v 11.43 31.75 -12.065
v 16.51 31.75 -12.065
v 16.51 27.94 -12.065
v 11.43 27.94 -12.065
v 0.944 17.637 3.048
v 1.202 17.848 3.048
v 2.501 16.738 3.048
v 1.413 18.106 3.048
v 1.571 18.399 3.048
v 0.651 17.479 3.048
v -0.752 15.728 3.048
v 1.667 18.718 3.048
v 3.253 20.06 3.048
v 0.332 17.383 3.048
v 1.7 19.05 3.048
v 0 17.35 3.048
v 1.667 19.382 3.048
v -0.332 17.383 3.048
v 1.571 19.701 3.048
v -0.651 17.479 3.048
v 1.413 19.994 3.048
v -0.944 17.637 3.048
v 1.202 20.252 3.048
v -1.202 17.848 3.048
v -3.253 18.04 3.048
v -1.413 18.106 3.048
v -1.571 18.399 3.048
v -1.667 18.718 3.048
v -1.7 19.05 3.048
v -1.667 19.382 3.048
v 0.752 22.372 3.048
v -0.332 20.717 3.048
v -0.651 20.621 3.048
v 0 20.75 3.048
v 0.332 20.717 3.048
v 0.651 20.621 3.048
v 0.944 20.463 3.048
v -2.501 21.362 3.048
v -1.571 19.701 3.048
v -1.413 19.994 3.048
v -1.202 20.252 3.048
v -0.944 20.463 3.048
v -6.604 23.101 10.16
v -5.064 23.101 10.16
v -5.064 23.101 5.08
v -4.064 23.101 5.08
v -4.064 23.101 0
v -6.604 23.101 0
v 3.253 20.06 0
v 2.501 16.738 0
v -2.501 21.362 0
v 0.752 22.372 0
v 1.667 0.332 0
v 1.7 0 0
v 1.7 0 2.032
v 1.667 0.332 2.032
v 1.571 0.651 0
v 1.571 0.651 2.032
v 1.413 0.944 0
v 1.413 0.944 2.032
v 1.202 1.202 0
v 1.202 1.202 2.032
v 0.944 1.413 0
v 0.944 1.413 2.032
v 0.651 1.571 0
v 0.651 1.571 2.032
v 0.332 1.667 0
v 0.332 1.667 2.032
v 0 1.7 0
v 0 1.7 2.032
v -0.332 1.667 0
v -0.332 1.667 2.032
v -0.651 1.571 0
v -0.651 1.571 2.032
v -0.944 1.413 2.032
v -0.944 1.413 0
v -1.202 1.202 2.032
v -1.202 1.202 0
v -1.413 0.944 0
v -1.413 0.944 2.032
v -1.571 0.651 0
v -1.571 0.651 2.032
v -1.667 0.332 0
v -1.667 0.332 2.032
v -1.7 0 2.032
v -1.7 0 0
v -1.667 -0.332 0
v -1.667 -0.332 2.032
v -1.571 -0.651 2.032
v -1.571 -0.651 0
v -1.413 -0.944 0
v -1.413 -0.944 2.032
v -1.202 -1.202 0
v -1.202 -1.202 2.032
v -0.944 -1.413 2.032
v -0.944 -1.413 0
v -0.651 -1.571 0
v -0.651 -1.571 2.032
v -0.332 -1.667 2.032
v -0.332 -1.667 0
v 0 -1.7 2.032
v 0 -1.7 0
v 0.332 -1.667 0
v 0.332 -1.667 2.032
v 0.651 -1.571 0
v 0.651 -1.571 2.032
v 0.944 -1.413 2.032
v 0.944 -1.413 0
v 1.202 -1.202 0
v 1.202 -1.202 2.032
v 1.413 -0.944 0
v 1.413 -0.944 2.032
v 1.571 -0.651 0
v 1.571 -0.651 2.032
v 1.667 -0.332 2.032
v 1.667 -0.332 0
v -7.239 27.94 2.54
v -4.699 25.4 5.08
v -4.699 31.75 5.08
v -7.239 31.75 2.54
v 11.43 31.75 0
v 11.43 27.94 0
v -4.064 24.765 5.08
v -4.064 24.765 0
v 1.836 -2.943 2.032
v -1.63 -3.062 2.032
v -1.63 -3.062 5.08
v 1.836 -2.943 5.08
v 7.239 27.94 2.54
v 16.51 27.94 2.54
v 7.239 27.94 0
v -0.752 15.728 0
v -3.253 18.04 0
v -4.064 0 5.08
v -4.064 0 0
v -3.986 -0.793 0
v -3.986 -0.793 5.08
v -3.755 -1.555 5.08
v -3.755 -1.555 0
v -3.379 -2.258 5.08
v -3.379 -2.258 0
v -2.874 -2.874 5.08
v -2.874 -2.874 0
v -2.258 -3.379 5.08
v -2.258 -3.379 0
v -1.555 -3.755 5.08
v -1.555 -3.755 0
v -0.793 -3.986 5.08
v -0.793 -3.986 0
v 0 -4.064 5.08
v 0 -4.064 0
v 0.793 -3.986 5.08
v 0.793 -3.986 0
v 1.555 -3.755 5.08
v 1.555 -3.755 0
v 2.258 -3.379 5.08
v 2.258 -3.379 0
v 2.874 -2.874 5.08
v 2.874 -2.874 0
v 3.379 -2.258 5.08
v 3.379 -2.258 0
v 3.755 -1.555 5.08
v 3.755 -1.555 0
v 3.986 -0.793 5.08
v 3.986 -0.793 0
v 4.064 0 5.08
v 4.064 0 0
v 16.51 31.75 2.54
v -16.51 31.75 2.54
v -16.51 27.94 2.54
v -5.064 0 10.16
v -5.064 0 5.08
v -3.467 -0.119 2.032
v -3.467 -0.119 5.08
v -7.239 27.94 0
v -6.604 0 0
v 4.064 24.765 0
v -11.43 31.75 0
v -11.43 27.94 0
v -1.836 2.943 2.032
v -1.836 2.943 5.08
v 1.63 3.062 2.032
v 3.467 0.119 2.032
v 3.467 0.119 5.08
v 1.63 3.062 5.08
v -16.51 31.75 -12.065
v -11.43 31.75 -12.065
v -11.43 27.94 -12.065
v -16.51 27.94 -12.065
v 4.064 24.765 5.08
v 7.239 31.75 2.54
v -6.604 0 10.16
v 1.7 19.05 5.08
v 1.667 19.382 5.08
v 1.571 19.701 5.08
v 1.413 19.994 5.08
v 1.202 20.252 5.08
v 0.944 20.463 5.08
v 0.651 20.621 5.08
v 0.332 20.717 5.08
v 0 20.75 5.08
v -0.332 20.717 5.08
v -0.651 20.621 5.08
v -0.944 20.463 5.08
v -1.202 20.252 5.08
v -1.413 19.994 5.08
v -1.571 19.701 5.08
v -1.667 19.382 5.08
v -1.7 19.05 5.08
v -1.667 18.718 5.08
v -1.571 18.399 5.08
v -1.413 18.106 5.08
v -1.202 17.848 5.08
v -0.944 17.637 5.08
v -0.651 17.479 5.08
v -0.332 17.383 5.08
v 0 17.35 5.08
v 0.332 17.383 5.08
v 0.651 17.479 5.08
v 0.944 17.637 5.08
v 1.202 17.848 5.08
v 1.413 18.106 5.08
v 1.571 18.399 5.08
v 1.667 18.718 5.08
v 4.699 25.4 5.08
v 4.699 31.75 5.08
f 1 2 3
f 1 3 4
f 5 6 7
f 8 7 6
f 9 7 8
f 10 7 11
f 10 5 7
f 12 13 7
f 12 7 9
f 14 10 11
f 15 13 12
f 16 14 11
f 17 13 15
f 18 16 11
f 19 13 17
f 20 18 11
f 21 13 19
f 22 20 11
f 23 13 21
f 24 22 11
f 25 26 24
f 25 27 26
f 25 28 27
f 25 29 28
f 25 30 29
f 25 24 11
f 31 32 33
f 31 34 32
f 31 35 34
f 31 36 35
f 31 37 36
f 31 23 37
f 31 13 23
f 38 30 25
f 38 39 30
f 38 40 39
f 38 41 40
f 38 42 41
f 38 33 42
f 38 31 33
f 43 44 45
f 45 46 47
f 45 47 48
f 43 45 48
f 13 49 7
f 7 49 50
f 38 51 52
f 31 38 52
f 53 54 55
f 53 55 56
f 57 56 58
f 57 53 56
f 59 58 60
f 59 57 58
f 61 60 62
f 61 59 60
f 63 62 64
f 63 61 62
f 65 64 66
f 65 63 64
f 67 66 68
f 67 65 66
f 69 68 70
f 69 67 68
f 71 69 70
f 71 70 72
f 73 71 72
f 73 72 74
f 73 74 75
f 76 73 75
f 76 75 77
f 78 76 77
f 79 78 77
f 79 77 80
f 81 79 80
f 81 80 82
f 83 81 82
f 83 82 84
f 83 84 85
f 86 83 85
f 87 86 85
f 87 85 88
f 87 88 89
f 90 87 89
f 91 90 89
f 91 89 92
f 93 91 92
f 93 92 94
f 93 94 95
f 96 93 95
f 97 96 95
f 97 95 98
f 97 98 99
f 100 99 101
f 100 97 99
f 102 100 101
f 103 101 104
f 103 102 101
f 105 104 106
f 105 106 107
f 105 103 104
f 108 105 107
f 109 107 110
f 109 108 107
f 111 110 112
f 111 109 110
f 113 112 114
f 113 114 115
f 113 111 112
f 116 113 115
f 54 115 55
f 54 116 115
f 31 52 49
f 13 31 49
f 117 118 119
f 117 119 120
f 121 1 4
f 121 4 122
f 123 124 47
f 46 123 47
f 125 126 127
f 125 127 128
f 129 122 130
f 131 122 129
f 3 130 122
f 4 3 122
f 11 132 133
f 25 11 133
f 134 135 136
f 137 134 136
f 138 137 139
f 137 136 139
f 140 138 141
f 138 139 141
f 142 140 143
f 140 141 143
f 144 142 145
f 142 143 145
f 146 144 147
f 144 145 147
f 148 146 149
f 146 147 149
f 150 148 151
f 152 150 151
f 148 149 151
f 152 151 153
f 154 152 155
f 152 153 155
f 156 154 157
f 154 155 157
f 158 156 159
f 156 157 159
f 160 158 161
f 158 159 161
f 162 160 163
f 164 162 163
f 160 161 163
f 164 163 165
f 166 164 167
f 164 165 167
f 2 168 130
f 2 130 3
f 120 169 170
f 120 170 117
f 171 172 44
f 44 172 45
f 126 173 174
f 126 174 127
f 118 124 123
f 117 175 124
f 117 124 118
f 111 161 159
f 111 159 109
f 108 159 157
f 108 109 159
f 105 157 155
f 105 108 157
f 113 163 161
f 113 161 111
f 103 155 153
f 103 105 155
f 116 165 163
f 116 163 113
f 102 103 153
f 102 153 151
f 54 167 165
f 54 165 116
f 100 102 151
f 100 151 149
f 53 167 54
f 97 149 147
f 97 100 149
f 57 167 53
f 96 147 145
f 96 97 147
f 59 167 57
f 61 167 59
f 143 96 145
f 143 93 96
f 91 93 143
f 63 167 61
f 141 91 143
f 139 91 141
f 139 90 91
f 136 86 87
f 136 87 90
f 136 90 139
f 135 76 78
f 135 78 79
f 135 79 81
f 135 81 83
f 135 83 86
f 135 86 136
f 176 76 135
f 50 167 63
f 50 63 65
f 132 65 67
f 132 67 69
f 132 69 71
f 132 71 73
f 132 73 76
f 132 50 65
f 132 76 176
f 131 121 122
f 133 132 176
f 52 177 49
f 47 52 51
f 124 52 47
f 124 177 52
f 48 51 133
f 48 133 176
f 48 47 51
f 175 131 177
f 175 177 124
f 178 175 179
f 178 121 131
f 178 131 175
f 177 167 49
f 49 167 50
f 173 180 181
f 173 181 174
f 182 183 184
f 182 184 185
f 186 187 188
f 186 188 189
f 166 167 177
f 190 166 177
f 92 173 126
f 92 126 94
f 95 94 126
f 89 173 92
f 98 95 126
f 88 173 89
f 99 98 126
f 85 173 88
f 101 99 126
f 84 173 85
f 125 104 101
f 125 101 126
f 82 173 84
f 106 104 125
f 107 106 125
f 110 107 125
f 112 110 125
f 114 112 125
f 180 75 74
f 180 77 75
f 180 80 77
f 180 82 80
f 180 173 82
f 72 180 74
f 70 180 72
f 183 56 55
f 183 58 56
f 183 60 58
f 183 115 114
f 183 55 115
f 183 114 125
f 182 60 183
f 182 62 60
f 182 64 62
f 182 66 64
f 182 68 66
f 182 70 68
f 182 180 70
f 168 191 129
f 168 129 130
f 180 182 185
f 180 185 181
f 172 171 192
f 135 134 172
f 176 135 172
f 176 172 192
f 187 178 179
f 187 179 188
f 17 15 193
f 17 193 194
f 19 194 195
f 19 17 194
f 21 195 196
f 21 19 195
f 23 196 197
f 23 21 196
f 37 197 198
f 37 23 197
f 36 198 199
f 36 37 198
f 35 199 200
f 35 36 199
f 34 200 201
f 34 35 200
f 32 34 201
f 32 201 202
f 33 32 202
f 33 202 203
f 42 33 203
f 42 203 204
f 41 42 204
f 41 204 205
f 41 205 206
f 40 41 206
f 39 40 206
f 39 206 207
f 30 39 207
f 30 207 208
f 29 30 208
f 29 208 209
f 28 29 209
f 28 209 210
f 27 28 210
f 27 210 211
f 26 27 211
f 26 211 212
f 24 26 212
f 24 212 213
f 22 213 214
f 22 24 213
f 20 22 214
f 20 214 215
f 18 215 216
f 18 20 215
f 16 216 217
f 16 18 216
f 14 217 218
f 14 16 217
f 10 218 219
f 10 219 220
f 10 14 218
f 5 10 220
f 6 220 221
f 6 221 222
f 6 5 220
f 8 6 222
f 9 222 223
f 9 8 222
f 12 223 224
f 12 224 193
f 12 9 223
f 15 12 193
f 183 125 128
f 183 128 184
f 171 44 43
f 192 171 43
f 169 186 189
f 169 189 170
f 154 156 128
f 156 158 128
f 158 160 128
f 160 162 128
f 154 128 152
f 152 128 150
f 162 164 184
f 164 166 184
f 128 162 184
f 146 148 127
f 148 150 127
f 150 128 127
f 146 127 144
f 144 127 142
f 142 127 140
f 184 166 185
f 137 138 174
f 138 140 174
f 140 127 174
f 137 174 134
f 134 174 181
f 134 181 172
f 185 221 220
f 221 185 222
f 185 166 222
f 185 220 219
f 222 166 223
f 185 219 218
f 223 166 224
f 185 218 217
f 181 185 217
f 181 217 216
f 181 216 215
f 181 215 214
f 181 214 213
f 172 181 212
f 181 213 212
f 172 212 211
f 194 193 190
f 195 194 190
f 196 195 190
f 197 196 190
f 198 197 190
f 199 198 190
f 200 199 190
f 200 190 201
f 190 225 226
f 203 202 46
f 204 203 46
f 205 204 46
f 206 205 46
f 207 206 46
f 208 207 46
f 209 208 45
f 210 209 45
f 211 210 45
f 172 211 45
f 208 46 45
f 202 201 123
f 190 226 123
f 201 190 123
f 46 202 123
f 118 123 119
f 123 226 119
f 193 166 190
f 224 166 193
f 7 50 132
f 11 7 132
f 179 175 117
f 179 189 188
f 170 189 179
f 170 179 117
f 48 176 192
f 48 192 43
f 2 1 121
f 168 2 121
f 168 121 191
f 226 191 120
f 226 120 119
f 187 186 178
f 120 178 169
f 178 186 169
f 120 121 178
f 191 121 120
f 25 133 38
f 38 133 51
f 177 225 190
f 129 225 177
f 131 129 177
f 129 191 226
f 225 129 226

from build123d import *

# Parameters (mm, degrees)
SKETCH2_R           = 1.700000029
BOSS_EXTRUDE1_DEPTH = 5.08
SKETCH4_W           = 2.54
SKETCH4_H           = 23.100716355
BOSS_EXTRUDE3_DEPTH = 5.08
BOSS_EXTRUDE4_START = -5.08
SKETCH4_4_W         = 1.54
SKETCH4_4_H         = 23.100716355
BOSS_EXTRUDE4_DEPTH = 5.08
CUT_EXTRUDE1_START  = -3.048
SKETCH5_R           = 1.700000029
CUT_EXTRUDE1_DEPTH  = 3.048
CUT_EXTRUDE2_DEPTH  = 3.048
BOSS_EXTRUDE5_DEPTH = 3.81
CHAMFER4_SIZE       = 3.175
CHAMFER5_SIZE       = 3.175


with BuildPart() as part:
    # Sketch2 → Boss-Extrude1 (new body)
    with BuildSketch(Plane.XY):
        with BuildLine():
            Line((-4.064, 19.05), (-4.064, 0))
            ThreePointArc((-4.064, 0), (0, -4.064), (4.064, 0))
            Line((4.064, 0), (4.064, 19.05))
            Line((4.064, 19.05), (4.064, 31.75))
            Line((4.064, 31.75), (-4.064, 31.75))
            Line((-4.064, 31.75), (-4.064, 19.05))
        make_face()
        Circle(SKETCH2_R, mode=Mode.SUBTRACT)
        with Locations((0, 19.05)):
            Circle(SKETCH2_R, mode=Mode.SUBTRACT)
    extrude(amount=BOSS_EXTRUDE1_DEPTH)

    # Sketch4 → Boss-Extrude3 (add)
    with BuildSketch(Plane(origin=(0, 0, 0), x_dir=(-1, 0, 0), z_dir=(0, 0, -1))):
        with Locations((5.334, 11.550358178)):
            Rectangle(SKETCH4_W, SKETCH4_H)
    extrude(amount=-BOSS_EXTRUDE3_DEPTH)

    # Sketch4<4> → Boss-Extrude4 (add)
    with BuildSketch(Plane(origin=(0, 0, 0), x_dir=(-1, 0, 0), z_dir=(0, 0, -1)).offset(BOSS_EXTRUDE4_START)):
        with Locations((5.834, 11.550358178)):
            Rectangle(SKETCH4_4_W, SKETCH4_4_H)
    extrude(amount=-BOSS_EXTRUDE4_DEPTH)

    # Sketch5 → Cut-Extrude1 (cut)
    with BuildSketch(Plane.XY.offset(5.08).offset(CUT_EXTRUDE1_START)):
        Polygon((1.63025736, 3.061744972), (-1.836420245, 2.942716775), (-3.466677606, -0.119028197), (-1.63025736, -3.061744972), (1.836420245, -2.942716775), (3.466677606, 0.119028197), align=None)
        Circle(SKETCH5_R, mode=Mode.SUBTRACT)
    extrude(amount=CUT_EXTRUDE1_DEPTH, mode=Mode.SUBTRACT)

    # Sketch6 → Cut-Extrude2 (cut)
    with BuildSketch(Plane(origin=(0, 0, 0), x_dir=(-1, 0, 0), z_dir=(0, 0, -1))):
        Polygon((-3.253201396, 20.05995743), (-2.501249489, 16.737623663), (0.751951906, 15.727666232), (3.253201396, 18.04004257), (2.501249489, 21.362376337), (-0.751951906, 22.372333768), align=None)
    extrude(amount=-CUT_EXTRUDE2_DEPTH, mode=Mode.SUBTRACT)

    # Sketch9 → Boss-Extrude5 (add)
    with BuildSketch(Plane(origin=(0, 31.75, 0), x_dir=(1, 0, 0), z_dir=(0, 1, 0))):
        Polygon((-16.51, 12.065), (-16.51, -2.54), (16.51, -2.54), (16.51, 12.065), (11.43, 12.065), (11.43, 0), (-11.43, 0), (-11.43, 12.065), align=None)
    extrude(amount=-BOSS_EXTRUDE5_DEPTH)

    # Chamfer4
    # the kernel refuses this chamfer: 3.175 mm, written as the material it adds along each edge
    with BuildSketch(Plane(origin=(4.064, 27.94, 2.54), x_dir=(0.9996219169112966, 0, -0.02749587661058635), z_dir=(0, 1, 0))) as chamfer4_piece_1_section:
        Polygon((CHAMFER4_SIZE * 0.999621916911, -CHAMFER4_SIZE * 0.0274958766106), (-CHAMFER4_SIZE * 0.0274958766106, -CHAMFER4_SIZE * 0.999621916911), (0, 0), align=None)
    chamfer4_piece_1 = extrude(amount=3.81, mode=Mode.PRIVATE)
    chamfer4_piece_1 = split(chamfer4_piece_1, bisect_by=Plane(origin=(5.161655959, 29.845, 5.08), z_dir=(0, 0, -1)), keep=Keep.TOP, mode=Mode.PRIVATE)
    add(chamfer4_piece_1)
    with BuildSketch(Plane(origin=(-4.064, 31.75, 2.54), x_dir=(0.02749587661058607, 0, 0.9996219169112968), z_dir=(0, -1, 0))) as chamfer4_piece_2_section:
        Polygon((CHAMFER4_SIZE * 0.999621916911, CHAMFER4_SIZE * 0.0274958766106), (-CHAMFER4_SIZE * 0.0274958766106, CHAMFER4_SIZE * 0.999621916911), (0, 0), align=None)
    chamfer4_piece_2 = extrude(amount=3.81, mode=Mode.PRIVATE)
    chamfer4_piece_2 = split(chamfer4_piece_2, bisect_by=Plane(origin=(-5.161655959, 29.845, 5.08), z_dir=(0, 0, -1)), keep=Keep.TOP, mode=Mode.PRIVATE)
    add(chamfer4_piece_2)

    # Chamfer5
    chamfer5_edges = [part.edges().sort_by_distance(p)[0] for p in [
        (4.064, 27.94, 2.54),
        (-4.064, 27.94, 2.54),
    ]]
    chamfer(chamfer5_edges, length=CHAMFER5_SIZE)


solid = part.part
